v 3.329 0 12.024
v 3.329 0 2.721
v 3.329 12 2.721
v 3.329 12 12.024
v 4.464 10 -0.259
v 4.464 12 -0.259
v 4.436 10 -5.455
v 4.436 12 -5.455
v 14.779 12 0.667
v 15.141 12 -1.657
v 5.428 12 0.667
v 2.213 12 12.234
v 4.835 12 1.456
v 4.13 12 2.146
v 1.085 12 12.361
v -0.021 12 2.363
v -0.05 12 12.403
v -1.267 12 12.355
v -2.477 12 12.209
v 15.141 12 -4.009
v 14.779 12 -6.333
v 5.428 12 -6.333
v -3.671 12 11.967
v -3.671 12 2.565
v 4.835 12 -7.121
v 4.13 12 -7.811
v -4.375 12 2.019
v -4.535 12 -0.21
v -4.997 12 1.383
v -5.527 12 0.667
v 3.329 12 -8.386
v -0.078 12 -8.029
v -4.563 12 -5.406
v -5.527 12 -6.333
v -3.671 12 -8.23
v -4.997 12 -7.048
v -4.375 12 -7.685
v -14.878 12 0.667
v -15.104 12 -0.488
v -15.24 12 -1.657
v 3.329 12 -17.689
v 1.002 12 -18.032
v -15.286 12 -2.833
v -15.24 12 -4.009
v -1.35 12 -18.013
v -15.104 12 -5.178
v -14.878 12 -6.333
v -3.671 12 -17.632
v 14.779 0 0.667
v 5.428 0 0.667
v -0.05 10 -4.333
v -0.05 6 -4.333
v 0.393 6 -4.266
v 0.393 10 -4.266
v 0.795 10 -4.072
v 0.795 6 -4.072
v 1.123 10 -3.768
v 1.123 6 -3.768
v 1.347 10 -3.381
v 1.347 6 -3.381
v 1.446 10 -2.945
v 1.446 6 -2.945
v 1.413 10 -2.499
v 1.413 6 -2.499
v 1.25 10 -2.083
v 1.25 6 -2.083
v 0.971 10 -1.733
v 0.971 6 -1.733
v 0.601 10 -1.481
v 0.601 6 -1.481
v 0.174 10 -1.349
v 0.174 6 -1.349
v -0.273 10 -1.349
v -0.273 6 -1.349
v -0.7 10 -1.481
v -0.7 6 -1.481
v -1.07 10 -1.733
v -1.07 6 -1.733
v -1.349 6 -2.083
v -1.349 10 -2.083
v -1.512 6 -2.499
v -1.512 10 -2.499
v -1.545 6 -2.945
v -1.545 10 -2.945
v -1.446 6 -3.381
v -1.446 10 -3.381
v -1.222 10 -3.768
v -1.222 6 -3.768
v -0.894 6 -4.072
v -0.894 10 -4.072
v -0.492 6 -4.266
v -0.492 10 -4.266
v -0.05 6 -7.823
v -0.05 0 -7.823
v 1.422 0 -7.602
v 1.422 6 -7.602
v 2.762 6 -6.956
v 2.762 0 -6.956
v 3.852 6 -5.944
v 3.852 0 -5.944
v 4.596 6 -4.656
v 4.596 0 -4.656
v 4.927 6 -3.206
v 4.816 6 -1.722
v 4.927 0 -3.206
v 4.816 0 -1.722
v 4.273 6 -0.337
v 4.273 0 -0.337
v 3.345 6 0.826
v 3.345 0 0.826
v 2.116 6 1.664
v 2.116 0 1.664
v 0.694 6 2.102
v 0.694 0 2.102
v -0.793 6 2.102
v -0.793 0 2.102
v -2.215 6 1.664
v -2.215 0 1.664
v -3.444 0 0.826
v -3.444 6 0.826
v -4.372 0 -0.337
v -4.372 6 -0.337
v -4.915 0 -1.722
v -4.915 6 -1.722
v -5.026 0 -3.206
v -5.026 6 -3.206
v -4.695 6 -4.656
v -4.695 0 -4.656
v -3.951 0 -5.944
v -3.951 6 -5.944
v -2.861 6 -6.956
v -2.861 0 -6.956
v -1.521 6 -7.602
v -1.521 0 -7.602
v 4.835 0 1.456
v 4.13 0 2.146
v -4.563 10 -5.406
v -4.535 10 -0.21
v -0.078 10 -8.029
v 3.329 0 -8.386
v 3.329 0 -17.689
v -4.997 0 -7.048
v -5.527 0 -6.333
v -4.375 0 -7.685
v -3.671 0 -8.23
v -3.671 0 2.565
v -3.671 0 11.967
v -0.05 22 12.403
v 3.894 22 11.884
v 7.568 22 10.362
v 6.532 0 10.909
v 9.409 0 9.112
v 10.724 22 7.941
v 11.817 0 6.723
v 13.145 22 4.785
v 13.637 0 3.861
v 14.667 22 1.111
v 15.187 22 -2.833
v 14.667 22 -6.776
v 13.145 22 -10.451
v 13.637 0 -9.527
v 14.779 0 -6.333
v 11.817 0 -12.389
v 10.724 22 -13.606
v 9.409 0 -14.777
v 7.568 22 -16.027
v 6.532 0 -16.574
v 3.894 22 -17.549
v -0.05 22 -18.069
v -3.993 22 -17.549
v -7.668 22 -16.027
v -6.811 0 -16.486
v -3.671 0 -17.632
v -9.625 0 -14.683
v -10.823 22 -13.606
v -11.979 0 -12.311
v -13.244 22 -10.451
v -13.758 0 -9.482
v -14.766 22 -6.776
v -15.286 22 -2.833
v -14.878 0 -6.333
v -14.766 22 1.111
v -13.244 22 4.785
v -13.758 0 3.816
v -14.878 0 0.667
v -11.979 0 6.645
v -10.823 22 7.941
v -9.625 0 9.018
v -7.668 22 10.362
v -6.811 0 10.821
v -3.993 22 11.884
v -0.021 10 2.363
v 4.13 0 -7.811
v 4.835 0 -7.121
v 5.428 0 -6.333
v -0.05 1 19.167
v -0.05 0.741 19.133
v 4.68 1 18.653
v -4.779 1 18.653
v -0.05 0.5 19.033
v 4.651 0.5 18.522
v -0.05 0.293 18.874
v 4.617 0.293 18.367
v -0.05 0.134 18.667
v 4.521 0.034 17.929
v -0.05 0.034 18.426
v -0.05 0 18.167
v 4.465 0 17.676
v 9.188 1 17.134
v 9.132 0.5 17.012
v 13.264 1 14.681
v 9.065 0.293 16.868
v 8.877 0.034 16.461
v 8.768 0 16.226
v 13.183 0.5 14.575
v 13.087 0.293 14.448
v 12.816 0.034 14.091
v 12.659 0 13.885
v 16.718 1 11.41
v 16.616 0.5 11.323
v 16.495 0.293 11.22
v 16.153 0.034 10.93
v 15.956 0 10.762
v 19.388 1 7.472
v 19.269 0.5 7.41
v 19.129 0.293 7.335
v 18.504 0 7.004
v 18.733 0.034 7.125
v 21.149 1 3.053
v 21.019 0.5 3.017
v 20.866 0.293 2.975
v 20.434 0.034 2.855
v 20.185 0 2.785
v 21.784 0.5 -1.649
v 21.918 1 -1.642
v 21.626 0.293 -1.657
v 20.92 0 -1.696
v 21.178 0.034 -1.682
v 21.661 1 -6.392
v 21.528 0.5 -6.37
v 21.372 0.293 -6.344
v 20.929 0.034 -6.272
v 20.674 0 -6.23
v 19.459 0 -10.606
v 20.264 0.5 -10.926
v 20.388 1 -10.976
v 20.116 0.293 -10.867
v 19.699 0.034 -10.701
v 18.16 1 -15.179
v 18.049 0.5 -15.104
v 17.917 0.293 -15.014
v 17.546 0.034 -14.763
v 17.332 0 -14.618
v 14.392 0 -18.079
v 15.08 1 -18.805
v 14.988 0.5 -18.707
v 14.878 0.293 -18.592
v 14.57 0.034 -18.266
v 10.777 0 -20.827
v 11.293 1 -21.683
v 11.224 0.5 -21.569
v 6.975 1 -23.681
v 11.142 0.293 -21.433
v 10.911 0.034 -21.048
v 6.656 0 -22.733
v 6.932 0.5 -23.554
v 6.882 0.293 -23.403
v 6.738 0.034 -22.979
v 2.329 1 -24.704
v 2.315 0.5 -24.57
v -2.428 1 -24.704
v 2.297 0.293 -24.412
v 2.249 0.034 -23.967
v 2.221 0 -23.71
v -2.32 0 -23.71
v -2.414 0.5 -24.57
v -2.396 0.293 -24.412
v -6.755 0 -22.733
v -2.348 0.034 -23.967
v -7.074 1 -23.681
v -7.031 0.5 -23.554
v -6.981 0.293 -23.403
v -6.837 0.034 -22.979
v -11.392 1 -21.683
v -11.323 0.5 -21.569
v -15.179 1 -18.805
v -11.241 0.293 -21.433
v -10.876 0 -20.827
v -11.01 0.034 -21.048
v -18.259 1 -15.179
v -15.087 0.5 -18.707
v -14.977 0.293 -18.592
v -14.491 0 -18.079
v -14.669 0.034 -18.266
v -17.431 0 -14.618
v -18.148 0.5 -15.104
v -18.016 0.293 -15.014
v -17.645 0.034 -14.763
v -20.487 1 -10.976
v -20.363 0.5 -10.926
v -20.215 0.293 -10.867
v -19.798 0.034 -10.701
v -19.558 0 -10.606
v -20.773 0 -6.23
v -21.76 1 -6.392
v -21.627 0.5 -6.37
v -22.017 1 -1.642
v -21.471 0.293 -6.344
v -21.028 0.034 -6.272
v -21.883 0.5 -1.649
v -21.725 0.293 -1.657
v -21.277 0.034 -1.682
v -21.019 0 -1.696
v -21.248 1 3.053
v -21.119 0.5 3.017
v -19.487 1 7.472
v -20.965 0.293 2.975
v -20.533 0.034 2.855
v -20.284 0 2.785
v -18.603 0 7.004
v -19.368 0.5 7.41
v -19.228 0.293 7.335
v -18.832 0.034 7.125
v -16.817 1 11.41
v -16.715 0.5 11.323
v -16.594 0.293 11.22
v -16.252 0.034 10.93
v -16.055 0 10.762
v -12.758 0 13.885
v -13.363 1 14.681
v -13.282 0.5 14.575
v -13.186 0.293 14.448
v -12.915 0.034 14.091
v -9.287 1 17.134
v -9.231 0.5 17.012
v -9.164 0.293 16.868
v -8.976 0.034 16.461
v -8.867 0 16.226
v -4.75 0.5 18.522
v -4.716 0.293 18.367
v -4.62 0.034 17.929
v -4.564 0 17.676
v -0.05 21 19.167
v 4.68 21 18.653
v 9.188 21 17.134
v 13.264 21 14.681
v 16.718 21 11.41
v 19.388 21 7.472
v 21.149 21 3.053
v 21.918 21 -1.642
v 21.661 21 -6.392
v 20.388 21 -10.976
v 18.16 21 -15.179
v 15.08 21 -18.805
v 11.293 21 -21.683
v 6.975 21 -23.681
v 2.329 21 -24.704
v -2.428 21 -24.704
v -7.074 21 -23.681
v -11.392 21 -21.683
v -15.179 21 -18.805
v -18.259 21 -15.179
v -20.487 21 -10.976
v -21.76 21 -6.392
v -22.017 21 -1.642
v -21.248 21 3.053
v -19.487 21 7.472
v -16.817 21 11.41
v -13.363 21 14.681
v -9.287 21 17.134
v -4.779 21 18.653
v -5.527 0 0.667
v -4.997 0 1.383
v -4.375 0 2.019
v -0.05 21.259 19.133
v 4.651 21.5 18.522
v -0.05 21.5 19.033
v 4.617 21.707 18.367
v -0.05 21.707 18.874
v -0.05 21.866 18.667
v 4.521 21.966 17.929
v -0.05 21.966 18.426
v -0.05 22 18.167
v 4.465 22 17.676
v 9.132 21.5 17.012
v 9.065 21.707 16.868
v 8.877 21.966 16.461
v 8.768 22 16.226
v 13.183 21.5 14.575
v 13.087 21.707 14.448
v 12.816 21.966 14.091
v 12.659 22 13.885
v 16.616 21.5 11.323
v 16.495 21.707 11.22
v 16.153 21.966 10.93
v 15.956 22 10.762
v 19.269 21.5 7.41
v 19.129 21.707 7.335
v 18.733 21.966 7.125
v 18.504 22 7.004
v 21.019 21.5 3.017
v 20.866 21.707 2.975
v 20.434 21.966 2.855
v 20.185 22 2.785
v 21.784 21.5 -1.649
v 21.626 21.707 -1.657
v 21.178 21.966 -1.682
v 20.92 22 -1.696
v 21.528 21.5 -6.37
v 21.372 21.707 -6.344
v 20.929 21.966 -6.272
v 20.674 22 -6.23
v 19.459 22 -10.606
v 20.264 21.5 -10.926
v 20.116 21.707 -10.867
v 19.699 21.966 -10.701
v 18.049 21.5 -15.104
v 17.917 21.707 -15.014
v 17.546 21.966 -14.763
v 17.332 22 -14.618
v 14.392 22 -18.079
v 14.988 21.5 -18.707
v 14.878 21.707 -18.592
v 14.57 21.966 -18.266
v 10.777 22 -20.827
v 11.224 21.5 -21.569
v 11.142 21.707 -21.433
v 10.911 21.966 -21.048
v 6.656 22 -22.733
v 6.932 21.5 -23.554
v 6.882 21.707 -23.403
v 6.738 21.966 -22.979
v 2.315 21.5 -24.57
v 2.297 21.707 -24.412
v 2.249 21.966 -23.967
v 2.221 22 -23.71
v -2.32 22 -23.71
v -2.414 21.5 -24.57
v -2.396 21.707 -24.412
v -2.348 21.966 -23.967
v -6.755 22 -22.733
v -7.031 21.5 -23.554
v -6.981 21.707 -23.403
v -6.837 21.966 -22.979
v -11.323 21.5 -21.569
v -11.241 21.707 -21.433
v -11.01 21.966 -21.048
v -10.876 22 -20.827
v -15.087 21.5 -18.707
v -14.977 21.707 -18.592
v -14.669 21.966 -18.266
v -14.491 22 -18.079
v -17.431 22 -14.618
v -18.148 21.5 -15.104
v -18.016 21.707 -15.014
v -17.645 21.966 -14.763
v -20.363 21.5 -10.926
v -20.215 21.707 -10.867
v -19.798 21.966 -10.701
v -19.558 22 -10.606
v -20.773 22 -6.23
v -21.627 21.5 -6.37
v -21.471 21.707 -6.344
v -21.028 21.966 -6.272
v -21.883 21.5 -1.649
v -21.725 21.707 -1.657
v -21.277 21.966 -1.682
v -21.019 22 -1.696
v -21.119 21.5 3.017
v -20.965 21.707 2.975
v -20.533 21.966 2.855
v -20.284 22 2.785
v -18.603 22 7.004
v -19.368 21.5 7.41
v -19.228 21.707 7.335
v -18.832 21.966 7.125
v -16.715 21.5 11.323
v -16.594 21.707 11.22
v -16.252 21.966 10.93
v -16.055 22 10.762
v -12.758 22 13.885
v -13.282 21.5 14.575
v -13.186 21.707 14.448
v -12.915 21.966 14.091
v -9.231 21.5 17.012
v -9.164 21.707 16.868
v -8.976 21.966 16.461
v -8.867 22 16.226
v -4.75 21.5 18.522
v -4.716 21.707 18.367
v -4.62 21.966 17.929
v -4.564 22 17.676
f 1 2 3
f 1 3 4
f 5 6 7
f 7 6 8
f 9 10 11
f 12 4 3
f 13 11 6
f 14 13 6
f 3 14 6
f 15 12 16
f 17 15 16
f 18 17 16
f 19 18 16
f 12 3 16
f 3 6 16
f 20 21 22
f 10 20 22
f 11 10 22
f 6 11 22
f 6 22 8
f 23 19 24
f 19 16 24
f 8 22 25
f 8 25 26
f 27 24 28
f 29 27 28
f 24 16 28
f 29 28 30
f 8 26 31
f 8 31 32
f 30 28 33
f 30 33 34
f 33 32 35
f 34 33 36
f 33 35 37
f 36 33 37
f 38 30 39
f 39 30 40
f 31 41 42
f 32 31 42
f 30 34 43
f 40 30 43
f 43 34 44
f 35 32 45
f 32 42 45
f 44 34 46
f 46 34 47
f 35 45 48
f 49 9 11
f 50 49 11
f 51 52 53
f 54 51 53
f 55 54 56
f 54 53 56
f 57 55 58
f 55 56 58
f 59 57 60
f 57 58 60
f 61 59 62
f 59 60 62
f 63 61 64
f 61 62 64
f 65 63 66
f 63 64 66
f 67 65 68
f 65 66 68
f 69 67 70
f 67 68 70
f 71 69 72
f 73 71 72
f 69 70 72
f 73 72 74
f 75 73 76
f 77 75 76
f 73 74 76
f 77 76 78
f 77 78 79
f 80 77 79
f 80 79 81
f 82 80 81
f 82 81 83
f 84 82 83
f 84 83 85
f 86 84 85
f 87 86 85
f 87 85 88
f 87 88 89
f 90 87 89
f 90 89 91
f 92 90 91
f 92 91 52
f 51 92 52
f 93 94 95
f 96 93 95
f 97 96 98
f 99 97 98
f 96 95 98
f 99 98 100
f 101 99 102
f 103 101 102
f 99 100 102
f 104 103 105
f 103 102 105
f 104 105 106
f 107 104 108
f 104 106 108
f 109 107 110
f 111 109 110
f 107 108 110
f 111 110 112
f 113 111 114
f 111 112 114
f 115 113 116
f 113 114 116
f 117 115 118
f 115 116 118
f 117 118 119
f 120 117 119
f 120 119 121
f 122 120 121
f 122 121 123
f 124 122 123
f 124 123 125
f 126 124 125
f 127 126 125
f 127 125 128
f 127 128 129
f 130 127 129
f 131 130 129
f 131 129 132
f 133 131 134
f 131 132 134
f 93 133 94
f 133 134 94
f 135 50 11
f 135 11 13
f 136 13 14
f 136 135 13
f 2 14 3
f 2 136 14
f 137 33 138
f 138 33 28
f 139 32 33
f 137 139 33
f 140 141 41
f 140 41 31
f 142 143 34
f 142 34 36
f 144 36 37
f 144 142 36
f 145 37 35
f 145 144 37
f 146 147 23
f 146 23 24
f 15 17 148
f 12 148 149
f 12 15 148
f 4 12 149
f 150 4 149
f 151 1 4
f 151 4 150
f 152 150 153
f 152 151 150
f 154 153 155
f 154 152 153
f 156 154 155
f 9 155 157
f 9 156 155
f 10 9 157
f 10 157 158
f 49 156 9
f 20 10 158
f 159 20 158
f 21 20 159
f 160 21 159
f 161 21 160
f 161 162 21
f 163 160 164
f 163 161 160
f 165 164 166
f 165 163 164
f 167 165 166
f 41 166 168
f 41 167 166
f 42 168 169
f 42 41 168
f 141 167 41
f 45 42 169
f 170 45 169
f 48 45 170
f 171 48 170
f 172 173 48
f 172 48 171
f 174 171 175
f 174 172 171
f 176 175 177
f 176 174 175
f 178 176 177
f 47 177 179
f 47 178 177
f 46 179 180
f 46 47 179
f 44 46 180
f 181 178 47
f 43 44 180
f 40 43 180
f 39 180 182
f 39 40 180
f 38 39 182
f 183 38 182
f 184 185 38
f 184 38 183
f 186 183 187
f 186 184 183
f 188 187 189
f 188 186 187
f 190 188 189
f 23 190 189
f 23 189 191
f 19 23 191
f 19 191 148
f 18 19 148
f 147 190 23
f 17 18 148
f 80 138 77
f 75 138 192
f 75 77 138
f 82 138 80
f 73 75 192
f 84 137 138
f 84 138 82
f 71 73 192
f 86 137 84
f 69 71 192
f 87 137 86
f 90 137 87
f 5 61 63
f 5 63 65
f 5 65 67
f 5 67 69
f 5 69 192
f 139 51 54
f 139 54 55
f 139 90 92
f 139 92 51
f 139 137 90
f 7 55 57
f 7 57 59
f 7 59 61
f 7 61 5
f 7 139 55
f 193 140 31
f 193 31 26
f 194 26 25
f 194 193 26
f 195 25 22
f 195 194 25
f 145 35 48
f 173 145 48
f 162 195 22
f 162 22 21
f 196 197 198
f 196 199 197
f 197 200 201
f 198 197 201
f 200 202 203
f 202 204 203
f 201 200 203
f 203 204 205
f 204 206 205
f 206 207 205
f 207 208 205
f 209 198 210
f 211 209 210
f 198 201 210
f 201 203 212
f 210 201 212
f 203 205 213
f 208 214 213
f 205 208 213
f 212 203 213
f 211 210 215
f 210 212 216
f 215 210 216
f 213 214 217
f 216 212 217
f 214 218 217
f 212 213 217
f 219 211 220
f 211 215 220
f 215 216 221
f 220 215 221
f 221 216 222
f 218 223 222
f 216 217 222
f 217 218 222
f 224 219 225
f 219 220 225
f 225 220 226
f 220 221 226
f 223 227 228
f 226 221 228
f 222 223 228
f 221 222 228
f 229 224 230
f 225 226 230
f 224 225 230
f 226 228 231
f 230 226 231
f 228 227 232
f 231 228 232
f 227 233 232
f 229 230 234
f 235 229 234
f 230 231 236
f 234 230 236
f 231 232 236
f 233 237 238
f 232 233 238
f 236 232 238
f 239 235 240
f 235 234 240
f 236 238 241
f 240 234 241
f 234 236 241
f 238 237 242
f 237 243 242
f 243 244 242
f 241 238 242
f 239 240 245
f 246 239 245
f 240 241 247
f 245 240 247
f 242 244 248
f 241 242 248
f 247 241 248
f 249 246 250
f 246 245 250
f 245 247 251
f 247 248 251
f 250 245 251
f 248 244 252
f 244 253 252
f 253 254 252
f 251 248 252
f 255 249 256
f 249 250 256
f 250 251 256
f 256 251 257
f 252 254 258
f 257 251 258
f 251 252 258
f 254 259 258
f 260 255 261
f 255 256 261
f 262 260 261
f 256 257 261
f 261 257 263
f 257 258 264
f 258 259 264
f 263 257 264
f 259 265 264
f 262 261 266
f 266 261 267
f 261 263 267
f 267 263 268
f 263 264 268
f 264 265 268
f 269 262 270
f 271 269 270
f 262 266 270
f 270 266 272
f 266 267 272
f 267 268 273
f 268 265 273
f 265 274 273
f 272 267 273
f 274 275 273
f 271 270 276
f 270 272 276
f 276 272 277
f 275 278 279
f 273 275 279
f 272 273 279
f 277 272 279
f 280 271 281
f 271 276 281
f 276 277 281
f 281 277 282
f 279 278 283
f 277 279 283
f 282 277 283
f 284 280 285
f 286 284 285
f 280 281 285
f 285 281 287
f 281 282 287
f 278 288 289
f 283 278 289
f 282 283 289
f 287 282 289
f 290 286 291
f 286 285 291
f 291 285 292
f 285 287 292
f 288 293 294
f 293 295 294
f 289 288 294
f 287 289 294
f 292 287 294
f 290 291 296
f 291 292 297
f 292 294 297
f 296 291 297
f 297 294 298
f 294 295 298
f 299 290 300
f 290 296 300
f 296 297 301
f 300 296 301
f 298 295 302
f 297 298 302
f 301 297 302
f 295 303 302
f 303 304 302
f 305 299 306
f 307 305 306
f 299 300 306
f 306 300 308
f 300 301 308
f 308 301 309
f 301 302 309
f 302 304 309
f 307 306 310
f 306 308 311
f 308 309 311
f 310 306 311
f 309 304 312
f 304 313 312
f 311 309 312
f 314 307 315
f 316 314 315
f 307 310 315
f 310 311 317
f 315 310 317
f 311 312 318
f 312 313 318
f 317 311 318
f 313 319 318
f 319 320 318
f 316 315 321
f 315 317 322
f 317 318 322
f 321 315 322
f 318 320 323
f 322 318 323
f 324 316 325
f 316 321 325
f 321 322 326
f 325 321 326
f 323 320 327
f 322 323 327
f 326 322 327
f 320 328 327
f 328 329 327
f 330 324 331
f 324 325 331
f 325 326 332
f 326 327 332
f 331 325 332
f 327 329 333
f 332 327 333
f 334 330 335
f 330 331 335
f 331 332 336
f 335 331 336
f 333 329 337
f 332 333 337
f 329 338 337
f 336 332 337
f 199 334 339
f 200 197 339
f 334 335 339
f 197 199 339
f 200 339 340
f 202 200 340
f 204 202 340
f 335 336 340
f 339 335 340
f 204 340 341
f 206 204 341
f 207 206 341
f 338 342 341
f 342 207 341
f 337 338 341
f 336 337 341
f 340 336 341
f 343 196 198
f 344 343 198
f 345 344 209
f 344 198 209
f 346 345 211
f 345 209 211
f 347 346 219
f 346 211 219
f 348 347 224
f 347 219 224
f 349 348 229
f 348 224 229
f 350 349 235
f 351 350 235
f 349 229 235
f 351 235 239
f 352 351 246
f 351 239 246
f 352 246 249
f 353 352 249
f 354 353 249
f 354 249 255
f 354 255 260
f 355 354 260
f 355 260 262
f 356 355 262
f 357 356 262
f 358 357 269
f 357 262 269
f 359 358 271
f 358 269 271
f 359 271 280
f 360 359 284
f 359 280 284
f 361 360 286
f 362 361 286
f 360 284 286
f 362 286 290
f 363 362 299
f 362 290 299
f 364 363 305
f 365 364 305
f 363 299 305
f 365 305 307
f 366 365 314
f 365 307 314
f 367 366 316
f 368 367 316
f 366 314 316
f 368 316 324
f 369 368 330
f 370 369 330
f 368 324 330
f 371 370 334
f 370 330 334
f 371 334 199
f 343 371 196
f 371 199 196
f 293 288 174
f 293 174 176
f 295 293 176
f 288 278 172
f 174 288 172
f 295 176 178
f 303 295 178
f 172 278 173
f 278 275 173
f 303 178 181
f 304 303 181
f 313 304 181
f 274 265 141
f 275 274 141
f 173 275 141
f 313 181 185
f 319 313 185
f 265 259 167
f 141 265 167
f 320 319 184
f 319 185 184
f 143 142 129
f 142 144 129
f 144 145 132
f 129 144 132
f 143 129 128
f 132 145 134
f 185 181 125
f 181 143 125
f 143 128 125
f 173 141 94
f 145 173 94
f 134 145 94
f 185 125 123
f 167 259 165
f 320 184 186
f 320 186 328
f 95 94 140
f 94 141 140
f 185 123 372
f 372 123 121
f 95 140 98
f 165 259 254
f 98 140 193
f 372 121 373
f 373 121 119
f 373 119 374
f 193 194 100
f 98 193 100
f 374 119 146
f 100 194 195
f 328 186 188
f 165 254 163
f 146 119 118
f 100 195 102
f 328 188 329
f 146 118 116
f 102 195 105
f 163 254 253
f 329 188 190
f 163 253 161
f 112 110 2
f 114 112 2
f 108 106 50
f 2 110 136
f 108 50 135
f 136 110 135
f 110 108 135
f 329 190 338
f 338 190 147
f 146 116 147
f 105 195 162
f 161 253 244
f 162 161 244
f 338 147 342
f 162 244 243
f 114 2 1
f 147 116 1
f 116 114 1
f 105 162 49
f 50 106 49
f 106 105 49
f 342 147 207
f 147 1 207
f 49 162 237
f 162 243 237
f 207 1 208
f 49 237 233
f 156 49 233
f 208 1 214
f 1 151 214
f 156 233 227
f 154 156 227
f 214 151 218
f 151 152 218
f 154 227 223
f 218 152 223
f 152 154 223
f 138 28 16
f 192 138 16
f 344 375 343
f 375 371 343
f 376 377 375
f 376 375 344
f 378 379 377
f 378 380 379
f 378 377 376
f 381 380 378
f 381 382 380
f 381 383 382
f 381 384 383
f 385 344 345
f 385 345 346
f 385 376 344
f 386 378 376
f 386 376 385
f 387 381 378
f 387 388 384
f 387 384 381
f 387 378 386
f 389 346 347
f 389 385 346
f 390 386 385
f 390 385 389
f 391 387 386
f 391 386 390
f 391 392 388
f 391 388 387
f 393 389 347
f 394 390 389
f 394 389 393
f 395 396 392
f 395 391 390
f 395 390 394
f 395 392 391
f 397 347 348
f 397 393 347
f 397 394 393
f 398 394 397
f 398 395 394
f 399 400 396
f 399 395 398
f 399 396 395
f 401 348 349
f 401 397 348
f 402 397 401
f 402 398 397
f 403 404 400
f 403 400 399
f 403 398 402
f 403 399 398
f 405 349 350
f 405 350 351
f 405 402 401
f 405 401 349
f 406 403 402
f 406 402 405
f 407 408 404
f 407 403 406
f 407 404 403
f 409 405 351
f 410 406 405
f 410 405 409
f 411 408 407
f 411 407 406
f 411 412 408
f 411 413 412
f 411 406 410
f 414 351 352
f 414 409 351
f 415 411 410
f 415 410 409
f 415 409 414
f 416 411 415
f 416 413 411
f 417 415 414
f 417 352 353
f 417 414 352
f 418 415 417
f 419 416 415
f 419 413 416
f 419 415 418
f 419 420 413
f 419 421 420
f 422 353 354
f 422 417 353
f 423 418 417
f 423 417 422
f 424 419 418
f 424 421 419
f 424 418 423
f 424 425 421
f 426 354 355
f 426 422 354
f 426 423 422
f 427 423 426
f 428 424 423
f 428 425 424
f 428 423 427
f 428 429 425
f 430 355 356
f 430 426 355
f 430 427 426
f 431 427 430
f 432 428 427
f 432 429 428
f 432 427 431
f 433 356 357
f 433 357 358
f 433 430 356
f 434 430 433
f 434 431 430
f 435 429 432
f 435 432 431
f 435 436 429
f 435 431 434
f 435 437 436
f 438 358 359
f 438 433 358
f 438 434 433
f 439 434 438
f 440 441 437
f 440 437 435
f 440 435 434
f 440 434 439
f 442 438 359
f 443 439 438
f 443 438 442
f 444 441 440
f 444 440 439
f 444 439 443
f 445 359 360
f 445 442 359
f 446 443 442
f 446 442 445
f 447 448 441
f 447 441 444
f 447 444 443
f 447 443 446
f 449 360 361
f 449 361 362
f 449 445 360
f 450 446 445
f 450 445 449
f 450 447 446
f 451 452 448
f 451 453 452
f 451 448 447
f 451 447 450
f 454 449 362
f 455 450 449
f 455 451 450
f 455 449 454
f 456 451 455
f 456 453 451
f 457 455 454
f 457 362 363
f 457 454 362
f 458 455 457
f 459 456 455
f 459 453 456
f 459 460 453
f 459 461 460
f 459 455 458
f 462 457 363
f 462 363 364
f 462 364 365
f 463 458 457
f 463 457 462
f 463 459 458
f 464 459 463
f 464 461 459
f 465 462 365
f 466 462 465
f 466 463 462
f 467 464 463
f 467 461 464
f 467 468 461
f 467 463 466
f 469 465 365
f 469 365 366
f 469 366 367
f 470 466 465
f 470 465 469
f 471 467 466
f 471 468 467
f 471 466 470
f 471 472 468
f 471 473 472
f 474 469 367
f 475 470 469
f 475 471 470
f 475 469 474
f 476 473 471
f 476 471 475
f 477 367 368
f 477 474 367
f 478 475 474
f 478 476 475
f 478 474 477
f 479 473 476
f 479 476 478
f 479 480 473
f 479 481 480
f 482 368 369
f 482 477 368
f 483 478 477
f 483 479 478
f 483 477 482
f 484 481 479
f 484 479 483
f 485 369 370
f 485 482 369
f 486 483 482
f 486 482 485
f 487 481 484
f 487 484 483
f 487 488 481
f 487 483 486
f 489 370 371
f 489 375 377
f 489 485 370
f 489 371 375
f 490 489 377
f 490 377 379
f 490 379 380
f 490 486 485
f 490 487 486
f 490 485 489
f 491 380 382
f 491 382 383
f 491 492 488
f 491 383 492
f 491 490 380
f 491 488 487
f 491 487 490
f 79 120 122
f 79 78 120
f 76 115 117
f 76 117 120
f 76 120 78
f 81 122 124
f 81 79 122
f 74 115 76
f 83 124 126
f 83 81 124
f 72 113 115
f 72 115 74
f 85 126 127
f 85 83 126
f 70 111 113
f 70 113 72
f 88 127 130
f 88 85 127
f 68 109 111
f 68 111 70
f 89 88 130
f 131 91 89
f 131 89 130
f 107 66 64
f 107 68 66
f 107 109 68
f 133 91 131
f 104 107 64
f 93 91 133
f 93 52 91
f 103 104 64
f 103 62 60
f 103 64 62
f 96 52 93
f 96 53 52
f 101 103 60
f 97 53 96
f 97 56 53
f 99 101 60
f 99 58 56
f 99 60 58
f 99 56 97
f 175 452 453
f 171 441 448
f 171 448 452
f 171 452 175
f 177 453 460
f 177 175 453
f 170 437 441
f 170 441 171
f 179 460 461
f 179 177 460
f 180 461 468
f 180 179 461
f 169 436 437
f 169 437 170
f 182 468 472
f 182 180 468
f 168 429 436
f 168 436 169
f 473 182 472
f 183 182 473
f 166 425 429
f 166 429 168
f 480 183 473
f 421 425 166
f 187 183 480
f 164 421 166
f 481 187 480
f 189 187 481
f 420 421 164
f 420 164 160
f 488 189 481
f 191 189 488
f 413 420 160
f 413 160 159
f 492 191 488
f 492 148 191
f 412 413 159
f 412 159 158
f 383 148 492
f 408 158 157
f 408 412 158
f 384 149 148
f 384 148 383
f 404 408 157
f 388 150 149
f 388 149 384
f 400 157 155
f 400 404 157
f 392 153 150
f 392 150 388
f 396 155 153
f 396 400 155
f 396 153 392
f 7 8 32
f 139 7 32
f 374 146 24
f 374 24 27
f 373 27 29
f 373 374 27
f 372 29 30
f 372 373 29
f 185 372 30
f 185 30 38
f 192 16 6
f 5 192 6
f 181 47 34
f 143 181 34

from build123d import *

# Parameters (mm, degrees)
SKETCH1_R           = 22
BOSS_EXTRUDE2_DEPTH = 22
SKETCH3_R           = 1.5
BOSS_EXTRUDE3_DEPTH = 12
SKETCH4_R           = 4.990818698
CUT_EXTRUDE1_DEPTH  = 6
CUT_EXTRUDE2_DEPTH  = 2
FILLET1_R           = 1
FILLET2_R           = 1


with BuildPart() as part:
    # Sketch1 → Boss-Extrude2 (new body)
    with BuildSketch(Plane(origin=(0, 0, 0), x_dir=(1, 0, 0), z_dir=(0, 1, 0))):
        with Locations((-0.049514064, 2.832612422)):
            Circle(SKETCH1_R)
        with BuildLine():
            ThreePointArc((-14.878078006, 6.332612422), (-10.77871042, 13.650220944), (-3.427707319, 17.689399387))
            ThreePointArc((-3.427707319, 17.689399387), (0.075639897, 18.068118487), (3.572292681, 17.631897015))
            ThreePointArc((3.572292681, 17.631897015), (10.7681799, 13.56172263), (14.779049878, 6.332612422))
            ThreePointArc((14.779049878, 6.332612422), (15.084299184, 4.594431121), (15.186506039, 2.832612422))
            ThreePointArc((15.186506039, 2.832612422), (15.084299184, 1.070793722), (14.779049878, -0.667387578))
            ThreePointArc((14.779049878, -0.667387578), (10.7681799, -7.896497787), (3.572292681, -11.966672172))
            ThreePointArc((3.572292681, -11.966672172), (0.075639897, -12.402893644), (-3.427707319, -12.024174543))
            ThreePointArc((-3.427707319, -12.024174543), (-10.77871042, -7.984996101), (-14.878078006, -0.667387578))
            ThreePointArc((-14.878078006, -0.667387578), (-15.285534168, 2.832612422), (-14.878078006, 6.332612422))
        make_face(mode=Mode.SUBTRACT)
    extrude(amount=BOSS_EXTRUDE2_DEPTH)


with BuildPart() as boss_extrude3_tool:
    # Sketch3 → Boss-Extrude3 (new body)
    with BuildSketch(Plane(origin=(0, 0, 0), x_dir=(-1, 0, 0), z_dir=(0, -1, 0))):
        with BuildLine():
            Line((-3.328678892, 17.689399127), (-3.328678892, 8.385792362))
            ThreePointArc((-3.328678892, 8.385792362), (-4.495647669, 7.479277859), (-5.427711213, 6.332612162))
            Line((-5.427711213, 6.332612162), (-14.77904958, 6.332612162))
            ThreePointArc((-14.77904958, 6.332612162), (-15.186505741, 2.832612162), (-14.77904958, -0.667387838))
            Line((-14.77904958, -0.667387838), (-5.427711213, -0.667387838))
            ThreePointArc((-5.427711213, -0.667387838), (-4.495647669, -1.814053536), (-3.328678892, -2.720568038))
            Line((-3.328678892, -2.720568038), (-3.328678892, -12.024174803))
            ThreePointArc((-3.328678892, -12.024174803), (0.174668323, -12.402893904), (3.671321108, -11.966672432))
            Line((3.671321108, -11.966672432), (3.671321108, -2.564842414))
            ThreePointArc((3.671321108, -2.564842414), (4.696898655, -1.711815111), (5.526739937, -0.667387838))
            Line((5.526739937, -0.667387838), (14.878078304, -0.667387838))
            ThreePointArc((14.878078304, -0.667387838), (15.183327611, 1.070793462), (15.285534465, 2.832612162))
            ThreePointArc((15.285534465, 2.832612162), (15.183327611, 4.594430862), (14.878078304, 6.332612162))
            Line((14.878078304, 6.332612162), (5.526739937, 6.332612162))
            ThreePointArc((5.526739937, 6.332612162), (4.696898655, 7.377039435), (3.671321108, 8.230066738))
            Line((3.671321108, 8.230066738), (3.671321108, 17.631896755))
            ThreePointArc((3.671321108, 17.631896755), (0.174668323, 18.068118227), (-3.328678892, 17.689399127))
        make_face()
        with Locations((0.049514362, 2.832612162)):
            Circle(SKETCH3_R, mode=Mode.SUBTRACT)
    extrude(amount=-BOSS_EXTRUDE3_DEPTH)


with BuildPart() as part_1:
    add(part.part)


with BuildPart() as part_2:
    # Boss-Extrude3: joined with boss_extrude3_tool
    add(part_1.part.fuse(boss_extrude3_tool.part, tol=0.00001))

    # Sketch4 → Cut-Extrude1 (cut)
    with BuildSketch(Plane(origin=(0, 0, 0), x_dir=(-1, 0, 0), z_dir=(0, -1, 0))):
        with Locations((0.049514362, 2.832612162)):
            Circle(SKETCH4_R)
    extrude(amount=-CUT_EXTRUDE1_DEPTH, mode=Mode.SUBTRACT)

    # Sketch5 → Cut-Extrude2 (cut)
    with BuildSketch(Plane(origin=(0, 12, 0), x_dir=(1, 0, 0), z_dir=(0, 1, 0))):
        Polygon((-4.56347244, 5.406360618), (-4.535424574, 0.210283895), (-0.021466198, -2.363464302), (4.464444311, 0.258864225), (4.436396445, 5.454940948), (-0.077561931, 8.028689145), align=None)
    extrude(amount=-CUT_EXTRUDE2_DEPTH, mode=Mode.SUBTRACT)

    # Fillet1
    fillet1_edges = [part_2.edges().sort_by_distance(p)[0] for p in [
        (-22.049514064, 22, -2.832612422),
    ]]
    fillet(fillet1_edges, radius=FILLET1_R)

    # Fillet2
    fillet2_edges = [part_2.edges().sort_by_distance(p)[0] for p in [
        (-22.049514064, 0, -2.832612422),
    ]]
    fillet(fillet2_edges, radius=FILLET2_R)


solid = part_2.part
